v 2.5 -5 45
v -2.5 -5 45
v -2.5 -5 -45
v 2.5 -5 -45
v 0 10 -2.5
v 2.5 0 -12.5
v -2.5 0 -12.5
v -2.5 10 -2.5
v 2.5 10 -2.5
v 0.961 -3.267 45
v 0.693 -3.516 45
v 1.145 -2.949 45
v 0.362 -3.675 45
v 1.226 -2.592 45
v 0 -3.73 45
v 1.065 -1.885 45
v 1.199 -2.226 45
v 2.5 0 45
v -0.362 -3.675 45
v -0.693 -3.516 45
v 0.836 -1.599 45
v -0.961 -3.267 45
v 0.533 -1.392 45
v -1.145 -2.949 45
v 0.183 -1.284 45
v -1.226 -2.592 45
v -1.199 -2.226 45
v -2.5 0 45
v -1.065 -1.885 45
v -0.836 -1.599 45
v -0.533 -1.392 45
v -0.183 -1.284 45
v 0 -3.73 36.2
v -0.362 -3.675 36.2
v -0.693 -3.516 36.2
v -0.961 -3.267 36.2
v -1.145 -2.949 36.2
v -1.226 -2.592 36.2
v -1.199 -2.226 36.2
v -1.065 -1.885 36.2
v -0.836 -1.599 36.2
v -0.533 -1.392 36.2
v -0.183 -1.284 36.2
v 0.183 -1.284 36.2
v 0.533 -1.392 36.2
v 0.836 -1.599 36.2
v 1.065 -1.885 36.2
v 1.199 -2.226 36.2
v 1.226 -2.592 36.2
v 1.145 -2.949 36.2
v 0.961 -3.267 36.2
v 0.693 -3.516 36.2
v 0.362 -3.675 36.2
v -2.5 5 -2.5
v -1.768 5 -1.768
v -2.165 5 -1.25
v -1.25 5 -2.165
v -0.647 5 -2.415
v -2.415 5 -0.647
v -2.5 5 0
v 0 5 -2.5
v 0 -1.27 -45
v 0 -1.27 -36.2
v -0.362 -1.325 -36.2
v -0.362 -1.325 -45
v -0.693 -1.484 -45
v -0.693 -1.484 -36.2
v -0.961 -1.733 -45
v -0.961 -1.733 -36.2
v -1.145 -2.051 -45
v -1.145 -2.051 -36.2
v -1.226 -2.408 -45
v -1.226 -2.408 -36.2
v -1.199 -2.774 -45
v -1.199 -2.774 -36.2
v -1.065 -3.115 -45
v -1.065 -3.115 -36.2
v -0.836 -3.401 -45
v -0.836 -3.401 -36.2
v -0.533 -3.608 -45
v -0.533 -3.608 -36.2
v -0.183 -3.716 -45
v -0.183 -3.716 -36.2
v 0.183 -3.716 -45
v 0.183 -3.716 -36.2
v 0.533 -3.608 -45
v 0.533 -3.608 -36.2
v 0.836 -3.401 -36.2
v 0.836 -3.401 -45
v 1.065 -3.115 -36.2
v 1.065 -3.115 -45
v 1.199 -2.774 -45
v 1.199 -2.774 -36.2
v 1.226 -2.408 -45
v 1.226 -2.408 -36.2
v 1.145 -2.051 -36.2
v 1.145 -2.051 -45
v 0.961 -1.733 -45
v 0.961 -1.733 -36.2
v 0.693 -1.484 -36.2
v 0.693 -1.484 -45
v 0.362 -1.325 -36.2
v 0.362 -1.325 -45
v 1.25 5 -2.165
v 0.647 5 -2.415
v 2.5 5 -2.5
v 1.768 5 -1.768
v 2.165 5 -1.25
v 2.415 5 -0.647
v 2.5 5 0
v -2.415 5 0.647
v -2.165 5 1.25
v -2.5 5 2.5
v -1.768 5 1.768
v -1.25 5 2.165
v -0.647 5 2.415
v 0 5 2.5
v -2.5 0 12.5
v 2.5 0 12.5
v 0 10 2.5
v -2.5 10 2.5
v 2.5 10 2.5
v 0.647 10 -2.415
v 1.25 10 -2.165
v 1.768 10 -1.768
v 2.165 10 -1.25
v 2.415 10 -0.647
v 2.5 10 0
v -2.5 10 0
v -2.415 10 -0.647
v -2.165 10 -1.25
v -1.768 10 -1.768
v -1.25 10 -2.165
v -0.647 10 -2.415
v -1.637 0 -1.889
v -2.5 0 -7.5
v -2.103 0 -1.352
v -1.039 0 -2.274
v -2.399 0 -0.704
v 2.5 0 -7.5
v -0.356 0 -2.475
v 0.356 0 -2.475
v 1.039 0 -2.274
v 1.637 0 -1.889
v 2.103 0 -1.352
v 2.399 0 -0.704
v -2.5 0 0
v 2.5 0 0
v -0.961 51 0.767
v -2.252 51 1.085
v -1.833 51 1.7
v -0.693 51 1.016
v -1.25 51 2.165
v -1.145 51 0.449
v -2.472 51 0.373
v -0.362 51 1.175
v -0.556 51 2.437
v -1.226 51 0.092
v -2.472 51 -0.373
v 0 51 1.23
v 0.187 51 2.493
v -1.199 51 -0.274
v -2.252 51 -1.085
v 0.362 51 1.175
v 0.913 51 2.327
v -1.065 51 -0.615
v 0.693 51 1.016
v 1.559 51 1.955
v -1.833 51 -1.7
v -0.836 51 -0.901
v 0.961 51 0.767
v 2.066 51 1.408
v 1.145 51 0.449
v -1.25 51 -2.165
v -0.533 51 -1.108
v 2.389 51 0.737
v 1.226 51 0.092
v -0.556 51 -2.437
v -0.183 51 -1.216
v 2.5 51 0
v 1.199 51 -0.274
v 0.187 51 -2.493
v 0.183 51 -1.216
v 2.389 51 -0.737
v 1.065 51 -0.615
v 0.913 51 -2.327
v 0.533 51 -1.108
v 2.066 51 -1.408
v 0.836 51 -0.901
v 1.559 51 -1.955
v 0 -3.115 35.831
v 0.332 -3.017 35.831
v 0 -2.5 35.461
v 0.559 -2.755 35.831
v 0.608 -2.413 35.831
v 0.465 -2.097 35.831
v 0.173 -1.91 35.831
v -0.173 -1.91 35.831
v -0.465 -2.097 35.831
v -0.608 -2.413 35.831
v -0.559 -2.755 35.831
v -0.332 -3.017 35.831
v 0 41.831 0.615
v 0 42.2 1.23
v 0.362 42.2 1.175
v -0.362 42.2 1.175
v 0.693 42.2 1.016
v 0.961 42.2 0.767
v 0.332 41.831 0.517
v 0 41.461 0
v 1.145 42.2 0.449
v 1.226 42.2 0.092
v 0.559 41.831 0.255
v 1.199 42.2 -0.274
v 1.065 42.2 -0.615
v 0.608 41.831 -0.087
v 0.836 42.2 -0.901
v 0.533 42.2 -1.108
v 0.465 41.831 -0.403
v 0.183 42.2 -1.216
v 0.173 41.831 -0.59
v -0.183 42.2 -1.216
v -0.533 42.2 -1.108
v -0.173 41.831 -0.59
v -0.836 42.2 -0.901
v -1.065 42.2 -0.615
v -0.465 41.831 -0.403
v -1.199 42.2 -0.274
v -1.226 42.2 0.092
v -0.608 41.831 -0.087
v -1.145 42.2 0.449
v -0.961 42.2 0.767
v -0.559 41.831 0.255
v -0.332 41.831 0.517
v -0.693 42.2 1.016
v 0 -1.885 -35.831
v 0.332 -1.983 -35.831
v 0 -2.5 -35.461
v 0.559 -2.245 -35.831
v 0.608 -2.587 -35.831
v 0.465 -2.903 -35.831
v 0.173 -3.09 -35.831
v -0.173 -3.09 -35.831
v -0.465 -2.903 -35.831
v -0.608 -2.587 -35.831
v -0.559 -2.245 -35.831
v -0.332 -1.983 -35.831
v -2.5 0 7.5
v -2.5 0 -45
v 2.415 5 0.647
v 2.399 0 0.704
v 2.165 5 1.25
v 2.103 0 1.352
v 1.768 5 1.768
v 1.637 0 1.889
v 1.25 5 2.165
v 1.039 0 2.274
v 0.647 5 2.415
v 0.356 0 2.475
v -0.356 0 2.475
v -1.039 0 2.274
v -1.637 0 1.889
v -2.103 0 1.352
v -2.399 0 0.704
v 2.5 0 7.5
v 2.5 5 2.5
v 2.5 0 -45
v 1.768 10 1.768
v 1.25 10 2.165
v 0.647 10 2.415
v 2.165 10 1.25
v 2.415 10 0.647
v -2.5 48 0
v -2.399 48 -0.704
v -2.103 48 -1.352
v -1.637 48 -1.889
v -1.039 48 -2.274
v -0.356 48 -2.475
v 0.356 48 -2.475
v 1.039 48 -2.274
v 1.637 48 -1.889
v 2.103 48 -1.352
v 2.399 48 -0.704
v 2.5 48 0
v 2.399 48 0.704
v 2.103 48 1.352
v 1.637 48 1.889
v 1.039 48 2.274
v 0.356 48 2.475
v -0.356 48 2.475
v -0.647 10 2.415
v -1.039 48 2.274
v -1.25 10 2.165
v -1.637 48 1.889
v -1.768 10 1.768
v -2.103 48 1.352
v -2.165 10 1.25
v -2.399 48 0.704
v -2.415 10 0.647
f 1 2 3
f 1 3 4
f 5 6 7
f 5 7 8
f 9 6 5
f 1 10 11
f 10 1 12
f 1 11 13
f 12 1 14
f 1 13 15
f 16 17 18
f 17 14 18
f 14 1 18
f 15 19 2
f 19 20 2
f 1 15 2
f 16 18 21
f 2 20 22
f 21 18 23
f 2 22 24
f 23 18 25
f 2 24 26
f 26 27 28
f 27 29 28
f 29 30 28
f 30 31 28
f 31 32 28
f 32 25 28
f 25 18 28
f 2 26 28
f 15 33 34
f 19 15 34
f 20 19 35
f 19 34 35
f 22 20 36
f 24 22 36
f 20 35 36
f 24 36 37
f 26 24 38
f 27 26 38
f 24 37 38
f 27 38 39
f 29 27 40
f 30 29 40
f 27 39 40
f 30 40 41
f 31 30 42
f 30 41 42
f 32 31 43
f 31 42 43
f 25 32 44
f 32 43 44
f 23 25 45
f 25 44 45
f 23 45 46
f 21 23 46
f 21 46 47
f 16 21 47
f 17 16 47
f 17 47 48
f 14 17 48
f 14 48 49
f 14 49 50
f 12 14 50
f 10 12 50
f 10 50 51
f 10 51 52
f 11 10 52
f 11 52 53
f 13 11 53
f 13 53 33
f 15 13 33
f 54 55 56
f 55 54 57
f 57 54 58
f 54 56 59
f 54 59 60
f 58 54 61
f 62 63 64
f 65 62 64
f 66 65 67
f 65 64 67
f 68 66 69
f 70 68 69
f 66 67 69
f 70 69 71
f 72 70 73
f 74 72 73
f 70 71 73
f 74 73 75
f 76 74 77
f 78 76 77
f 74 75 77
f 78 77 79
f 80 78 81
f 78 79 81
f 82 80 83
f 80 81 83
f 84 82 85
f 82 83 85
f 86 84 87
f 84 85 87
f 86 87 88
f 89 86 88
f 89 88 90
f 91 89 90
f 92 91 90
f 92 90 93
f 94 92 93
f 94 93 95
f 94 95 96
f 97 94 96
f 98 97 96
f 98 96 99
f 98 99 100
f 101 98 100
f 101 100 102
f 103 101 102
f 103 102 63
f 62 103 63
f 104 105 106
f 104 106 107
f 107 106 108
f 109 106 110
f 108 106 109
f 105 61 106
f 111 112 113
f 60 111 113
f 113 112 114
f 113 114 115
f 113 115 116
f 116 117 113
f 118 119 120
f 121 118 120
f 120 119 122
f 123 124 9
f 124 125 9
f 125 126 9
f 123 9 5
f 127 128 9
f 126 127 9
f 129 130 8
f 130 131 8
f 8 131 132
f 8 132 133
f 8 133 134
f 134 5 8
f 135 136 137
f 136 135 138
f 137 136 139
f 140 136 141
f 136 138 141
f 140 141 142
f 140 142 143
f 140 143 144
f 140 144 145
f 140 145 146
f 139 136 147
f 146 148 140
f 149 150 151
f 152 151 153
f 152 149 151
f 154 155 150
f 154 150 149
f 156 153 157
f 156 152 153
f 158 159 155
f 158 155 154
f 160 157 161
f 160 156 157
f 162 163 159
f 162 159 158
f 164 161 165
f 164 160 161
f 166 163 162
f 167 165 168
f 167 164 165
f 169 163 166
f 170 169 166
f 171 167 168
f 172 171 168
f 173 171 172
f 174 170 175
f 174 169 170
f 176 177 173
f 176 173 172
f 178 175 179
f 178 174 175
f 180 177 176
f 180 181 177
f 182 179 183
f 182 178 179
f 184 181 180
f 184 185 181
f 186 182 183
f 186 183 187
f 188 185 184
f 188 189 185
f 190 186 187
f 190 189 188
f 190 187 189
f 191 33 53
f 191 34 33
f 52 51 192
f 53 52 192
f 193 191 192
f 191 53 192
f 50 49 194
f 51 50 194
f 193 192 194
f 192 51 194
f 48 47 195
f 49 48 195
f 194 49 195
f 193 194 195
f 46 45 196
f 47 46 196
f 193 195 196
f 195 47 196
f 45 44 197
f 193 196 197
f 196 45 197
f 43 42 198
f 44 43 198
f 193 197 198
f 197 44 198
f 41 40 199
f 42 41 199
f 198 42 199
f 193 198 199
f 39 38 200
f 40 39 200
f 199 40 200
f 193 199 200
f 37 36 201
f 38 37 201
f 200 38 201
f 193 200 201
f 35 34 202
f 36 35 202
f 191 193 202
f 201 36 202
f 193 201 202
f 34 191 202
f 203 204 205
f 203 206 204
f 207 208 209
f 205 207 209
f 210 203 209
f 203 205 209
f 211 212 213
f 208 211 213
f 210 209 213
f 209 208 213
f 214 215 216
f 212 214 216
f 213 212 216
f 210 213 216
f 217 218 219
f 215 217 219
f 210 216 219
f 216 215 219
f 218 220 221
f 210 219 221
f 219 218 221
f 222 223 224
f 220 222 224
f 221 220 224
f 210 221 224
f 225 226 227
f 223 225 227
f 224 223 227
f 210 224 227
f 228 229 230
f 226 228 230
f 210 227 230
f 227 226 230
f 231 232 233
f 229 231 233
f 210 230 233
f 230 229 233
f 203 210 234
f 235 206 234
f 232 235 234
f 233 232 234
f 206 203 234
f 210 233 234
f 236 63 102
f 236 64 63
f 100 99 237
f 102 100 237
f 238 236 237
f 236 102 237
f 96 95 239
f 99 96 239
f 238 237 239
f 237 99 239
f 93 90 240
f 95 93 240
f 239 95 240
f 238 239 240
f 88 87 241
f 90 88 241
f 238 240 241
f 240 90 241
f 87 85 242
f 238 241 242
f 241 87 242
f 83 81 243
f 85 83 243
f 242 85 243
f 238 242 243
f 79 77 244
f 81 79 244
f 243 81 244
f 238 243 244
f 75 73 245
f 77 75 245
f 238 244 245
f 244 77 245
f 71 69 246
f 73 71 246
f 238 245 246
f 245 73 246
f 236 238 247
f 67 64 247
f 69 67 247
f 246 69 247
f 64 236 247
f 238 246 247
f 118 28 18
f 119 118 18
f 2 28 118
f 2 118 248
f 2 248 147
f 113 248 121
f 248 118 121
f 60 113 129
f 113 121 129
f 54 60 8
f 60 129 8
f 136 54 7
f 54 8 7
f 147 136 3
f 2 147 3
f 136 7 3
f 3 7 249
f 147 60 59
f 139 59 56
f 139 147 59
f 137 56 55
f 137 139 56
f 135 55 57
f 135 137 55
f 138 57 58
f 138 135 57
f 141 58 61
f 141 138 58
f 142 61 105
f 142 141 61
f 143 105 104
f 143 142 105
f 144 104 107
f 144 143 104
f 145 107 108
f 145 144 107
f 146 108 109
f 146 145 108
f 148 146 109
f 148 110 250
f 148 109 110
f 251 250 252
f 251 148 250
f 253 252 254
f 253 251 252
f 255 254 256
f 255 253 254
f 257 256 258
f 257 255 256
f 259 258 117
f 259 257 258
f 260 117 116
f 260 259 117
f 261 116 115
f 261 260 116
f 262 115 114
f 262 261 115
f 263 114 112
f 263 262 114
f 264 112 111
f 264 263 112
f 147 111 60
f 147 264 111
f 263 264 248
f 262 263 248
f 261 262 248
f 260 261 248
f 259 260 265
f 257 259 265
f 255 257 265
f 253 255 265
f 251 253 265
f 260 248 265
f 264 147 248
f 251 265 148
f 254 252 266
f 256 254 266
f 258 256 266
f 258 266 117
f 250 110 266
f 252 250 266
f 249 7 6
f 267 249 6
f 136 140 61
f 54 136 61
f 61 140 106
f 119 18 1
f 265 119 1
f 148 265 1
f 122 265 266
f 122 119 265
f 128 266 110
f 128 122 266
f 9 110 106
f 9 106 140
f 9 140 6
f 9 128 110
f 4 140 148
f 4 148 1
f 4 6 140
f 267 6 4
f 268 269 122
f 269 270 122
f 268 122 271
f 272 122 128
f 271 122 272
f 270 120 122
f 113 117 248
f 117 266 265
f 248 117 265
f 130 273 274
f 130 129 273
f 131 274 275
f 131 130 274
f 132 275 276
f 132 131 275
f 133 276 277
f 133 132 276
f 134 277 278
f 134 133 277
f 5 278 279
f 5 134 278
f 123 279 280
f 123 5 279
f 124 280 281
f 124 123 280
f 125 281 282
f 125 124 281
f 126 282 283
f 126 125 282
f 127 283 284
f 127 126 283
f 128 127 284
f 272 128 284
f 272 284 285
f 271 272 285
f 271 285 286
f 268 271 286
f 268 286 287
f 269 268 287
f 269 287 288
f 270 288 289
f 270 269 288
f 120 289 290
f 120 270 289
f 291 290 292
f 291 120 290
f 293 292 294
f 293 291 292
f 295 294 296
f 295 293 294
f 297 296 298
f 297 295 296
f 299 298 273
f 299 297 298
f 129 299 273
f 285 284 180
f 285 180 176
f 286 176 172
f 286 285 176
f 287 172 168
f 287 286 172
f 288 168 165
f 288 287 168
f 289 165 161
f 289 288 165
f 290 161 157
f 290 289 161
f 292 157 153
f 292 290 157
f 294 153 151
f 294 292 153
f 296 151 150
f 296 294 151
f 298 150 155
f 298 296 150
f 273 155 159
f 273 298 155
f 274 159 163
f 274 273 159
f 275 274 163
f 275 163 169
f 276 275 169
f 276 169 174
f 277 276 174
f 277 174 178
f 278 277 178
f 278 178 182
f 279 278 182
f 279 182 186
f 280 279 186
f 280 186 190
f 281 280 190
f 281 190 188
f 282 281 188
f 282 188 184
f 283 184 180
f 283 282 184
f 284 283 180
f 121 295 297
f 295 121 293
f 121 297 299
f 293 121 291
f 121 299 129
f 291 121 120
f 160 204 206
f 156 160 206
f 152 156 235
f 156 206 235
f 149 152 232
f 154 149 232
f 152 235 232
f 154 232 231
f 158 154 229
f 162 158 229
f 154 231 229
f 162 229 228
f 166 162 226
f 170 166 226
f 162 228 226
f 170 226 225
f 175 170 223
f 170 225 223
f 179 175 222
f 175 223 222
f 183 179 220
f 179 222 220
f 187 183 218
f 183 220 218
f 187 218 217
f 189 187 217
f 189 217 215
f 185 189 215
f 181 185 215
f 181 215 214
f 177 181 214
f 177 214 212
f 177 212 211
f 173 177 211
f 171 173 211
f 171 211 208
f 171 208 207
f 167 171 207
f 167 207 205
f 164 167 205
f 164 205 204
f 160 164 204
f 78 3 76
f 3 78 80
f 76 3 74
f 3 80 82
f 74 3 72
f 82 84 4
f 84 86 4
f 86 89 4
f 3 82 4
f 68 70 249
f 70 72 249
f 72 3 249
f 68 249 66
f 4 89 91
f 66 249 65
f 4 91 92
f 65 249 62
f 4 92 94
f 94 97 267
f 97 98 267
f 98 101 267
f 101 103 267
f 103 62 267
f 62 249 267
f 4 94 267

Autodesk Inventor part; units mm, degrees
ref_plane "YZ Plane" through (0, 0, 0) normal (1, 0, 0) x (0, 1, 0)
ref_plane "XZ Plane" through (0, 0, 0) normal (0, 1, 0) x (-1, 0, 0)
ref_plane "XY Plane" through (0, 0, 0) normal (0, 0, 1) x (1, 0, 0)
sketch "Szkic1" plane through (0, 0, 0) normal (0, 1, 0) x (-1, 0, 0)
  circle A0 centre (0, 0) radius 2.5
  dimension "d0" = 5
extrude "Wyciągnięcie proste1" add sketch "Szkic1" along normal blind 48
sketch "Szkic2" plane through (0, 0, 0) normal (0, -1, 0) x (1, 0, 0)
  line L0 (2.5, -45) -> (2.5, 45)
  line L1 (2.5, 45) -> (-2.5, 45)
  line L2 (-2.5, 45) -> (-2.5, -45)
  line L3 (-2.5, -45) -> (2.5, -45)
  line L4 (2.5, -45) -> (-2.5, 45) construction
  line L5 (2.5, 45) -> (-2.5, -45) construction
  point P0 (0, 0)
  dimension "d3" = 90
extrude "Wyciągnięcie proste2" add sketch "Szkic2" along normal blind 5
sketch "Szkic4" plane through (2.5, 0, -45) normal (0, 0, -1) x (-1, 0, 0)
  line L0 (5, 0) -> (5, -5) projected
  line L1 (5, -2.5) -> (0, -2.5)
  line L2 (0, 0) -> (0, -5) projected
  line L3 (0, -5) -> (5, -5) projected
  line L4 (2.5, -5) -> (2.5, 0)
  point P0 (2.5, -2.5)
hole "Otwór2" at (0, -2.5, -45) direction (0, 0, 1) diameter 2.459 depth 8.8 tip angle 118 thread size "M3x0.5" class "6H" standard "ISO Metric profile"
sketch "Szkic5" plane through (-2.5, 0, 45) normal (0, 0, 1) x (1, 0, 0)
  line L0 (0, -5) -> (5, -5) projected
  line L1 (2.5, -5) -> (2.5, 0)
  line L2 (2.5, 0) -> (5, -2.5)
  line L3 (5, 0) -> (5, -5) projected
  line L4 (0, 0) -> (0, -5) projected
  line L5 (0, -2.5) -> (5, -2.5)
  circle A0 centre (2.5, -2.5) radius 1.2295 projected
hole "Otwór3" at (0, -2.5, 45) direction (0, 0, -1) diameter 2.459 depth 8.8 tip angle 118 thread size "M3x0.5" class "6H" standard "ISO Metric profile"
sketch "Szkic7" plane through (2.5, 0, 0) normal (1, 0, 0) x (0, 0, -1)
  line L0 (-45, -5) -> (45, -5) projected
  line L1 (-10, -5) -> (-10, 0)
  line L2 (0, -15.6) -> (0, 58.6) projected
  line L3 (10, -5) -> (10, 0)
  line L4 (10, -2.5) -> (-10, -2.5)
  line L5 (45, 0) -> (0, 0) projected
  line L6 (12.5, -5) -> (7.5, -5)
  line L7 (7.5, -5) -> (7.5, 0)
  line L8 (7.5, 0) -> (12.5, 0)
  line L9 (12.5, 0) -> (12.5, -5)
  line L10 (0, 0) -> (-45, 0) projected
  line L11 (-7.5, -5) -> (-12.5, -5)
  line L12 (-12.5, -5) -> (-12.5, 0)
  line L13 (-12.5, 0) -> (-7.5, 0)
  line L14 (-7.5, 0) -> (-7.5, -5)
  line L15 (2.5, 0) -> (2.5, 48) projected
  line L16 (2.5, 7.5) -> (-2.5498, 7.5)
  line L17 (2.5, 5) -> (-2.5, 5)
  line L18 (-2.5, 5) -> (-2.5, 10)
  line L19 (-2.5, 10) -> (2.5, 10)
  line L20 (2.5, 10) -> (2.5, 5)
  line L21 (12.5, 0) -> (2.5, 10)
  line L22 (7.5, 0) -> (2.5, 5)
  line L23 (-2.5, 5) -> (-7.5, 0)
  line L24 (-12.5, 0) -> (-2.5, 10)
  point P0 (0, -2.5)
  point P1 (0, 7.509)
  dimension "d28" = 10
  dimension "d29" = 5
  dimension "d30" = 5
  dimension "d31" = 5
  dimension "d32" = 5
extrude "Wyciągnięcie proste3" add sketch "Szkic7" against normal blind 5 contours L24 L18 L23 L10 | L19 L2 L16 L18 | L16 L2 L17 L18 | L19 L15 L16 L2 | L16 L15 L17 L2 | L21 L5 L22 L15
sketch "Szkic8" plane through (0, 48, 0) normal (0, 1, 0) x (1, 0, 0)
  circle A0 centre (0, 0) radius 2.5
extrude "Wyciągnięcie proste4" add sketch "Szkic8" along normal blind 3
sketch "Szkic9" plane through (0, 51, 0) normal (0, 1, 0) x (1, 0, 0)
  point P0 (0, 0)
  point P1 (0, 0)
hole "Otwór4" at (0, 51, 0) direction (0, -1, 0) diameter 2.459 depth 8.8 tip angle 118 thread size "M3x0.5" class "6H" standard "ISO Metric profile"
properties part number "Część L1" material "Stal nierdzewna 440C"
